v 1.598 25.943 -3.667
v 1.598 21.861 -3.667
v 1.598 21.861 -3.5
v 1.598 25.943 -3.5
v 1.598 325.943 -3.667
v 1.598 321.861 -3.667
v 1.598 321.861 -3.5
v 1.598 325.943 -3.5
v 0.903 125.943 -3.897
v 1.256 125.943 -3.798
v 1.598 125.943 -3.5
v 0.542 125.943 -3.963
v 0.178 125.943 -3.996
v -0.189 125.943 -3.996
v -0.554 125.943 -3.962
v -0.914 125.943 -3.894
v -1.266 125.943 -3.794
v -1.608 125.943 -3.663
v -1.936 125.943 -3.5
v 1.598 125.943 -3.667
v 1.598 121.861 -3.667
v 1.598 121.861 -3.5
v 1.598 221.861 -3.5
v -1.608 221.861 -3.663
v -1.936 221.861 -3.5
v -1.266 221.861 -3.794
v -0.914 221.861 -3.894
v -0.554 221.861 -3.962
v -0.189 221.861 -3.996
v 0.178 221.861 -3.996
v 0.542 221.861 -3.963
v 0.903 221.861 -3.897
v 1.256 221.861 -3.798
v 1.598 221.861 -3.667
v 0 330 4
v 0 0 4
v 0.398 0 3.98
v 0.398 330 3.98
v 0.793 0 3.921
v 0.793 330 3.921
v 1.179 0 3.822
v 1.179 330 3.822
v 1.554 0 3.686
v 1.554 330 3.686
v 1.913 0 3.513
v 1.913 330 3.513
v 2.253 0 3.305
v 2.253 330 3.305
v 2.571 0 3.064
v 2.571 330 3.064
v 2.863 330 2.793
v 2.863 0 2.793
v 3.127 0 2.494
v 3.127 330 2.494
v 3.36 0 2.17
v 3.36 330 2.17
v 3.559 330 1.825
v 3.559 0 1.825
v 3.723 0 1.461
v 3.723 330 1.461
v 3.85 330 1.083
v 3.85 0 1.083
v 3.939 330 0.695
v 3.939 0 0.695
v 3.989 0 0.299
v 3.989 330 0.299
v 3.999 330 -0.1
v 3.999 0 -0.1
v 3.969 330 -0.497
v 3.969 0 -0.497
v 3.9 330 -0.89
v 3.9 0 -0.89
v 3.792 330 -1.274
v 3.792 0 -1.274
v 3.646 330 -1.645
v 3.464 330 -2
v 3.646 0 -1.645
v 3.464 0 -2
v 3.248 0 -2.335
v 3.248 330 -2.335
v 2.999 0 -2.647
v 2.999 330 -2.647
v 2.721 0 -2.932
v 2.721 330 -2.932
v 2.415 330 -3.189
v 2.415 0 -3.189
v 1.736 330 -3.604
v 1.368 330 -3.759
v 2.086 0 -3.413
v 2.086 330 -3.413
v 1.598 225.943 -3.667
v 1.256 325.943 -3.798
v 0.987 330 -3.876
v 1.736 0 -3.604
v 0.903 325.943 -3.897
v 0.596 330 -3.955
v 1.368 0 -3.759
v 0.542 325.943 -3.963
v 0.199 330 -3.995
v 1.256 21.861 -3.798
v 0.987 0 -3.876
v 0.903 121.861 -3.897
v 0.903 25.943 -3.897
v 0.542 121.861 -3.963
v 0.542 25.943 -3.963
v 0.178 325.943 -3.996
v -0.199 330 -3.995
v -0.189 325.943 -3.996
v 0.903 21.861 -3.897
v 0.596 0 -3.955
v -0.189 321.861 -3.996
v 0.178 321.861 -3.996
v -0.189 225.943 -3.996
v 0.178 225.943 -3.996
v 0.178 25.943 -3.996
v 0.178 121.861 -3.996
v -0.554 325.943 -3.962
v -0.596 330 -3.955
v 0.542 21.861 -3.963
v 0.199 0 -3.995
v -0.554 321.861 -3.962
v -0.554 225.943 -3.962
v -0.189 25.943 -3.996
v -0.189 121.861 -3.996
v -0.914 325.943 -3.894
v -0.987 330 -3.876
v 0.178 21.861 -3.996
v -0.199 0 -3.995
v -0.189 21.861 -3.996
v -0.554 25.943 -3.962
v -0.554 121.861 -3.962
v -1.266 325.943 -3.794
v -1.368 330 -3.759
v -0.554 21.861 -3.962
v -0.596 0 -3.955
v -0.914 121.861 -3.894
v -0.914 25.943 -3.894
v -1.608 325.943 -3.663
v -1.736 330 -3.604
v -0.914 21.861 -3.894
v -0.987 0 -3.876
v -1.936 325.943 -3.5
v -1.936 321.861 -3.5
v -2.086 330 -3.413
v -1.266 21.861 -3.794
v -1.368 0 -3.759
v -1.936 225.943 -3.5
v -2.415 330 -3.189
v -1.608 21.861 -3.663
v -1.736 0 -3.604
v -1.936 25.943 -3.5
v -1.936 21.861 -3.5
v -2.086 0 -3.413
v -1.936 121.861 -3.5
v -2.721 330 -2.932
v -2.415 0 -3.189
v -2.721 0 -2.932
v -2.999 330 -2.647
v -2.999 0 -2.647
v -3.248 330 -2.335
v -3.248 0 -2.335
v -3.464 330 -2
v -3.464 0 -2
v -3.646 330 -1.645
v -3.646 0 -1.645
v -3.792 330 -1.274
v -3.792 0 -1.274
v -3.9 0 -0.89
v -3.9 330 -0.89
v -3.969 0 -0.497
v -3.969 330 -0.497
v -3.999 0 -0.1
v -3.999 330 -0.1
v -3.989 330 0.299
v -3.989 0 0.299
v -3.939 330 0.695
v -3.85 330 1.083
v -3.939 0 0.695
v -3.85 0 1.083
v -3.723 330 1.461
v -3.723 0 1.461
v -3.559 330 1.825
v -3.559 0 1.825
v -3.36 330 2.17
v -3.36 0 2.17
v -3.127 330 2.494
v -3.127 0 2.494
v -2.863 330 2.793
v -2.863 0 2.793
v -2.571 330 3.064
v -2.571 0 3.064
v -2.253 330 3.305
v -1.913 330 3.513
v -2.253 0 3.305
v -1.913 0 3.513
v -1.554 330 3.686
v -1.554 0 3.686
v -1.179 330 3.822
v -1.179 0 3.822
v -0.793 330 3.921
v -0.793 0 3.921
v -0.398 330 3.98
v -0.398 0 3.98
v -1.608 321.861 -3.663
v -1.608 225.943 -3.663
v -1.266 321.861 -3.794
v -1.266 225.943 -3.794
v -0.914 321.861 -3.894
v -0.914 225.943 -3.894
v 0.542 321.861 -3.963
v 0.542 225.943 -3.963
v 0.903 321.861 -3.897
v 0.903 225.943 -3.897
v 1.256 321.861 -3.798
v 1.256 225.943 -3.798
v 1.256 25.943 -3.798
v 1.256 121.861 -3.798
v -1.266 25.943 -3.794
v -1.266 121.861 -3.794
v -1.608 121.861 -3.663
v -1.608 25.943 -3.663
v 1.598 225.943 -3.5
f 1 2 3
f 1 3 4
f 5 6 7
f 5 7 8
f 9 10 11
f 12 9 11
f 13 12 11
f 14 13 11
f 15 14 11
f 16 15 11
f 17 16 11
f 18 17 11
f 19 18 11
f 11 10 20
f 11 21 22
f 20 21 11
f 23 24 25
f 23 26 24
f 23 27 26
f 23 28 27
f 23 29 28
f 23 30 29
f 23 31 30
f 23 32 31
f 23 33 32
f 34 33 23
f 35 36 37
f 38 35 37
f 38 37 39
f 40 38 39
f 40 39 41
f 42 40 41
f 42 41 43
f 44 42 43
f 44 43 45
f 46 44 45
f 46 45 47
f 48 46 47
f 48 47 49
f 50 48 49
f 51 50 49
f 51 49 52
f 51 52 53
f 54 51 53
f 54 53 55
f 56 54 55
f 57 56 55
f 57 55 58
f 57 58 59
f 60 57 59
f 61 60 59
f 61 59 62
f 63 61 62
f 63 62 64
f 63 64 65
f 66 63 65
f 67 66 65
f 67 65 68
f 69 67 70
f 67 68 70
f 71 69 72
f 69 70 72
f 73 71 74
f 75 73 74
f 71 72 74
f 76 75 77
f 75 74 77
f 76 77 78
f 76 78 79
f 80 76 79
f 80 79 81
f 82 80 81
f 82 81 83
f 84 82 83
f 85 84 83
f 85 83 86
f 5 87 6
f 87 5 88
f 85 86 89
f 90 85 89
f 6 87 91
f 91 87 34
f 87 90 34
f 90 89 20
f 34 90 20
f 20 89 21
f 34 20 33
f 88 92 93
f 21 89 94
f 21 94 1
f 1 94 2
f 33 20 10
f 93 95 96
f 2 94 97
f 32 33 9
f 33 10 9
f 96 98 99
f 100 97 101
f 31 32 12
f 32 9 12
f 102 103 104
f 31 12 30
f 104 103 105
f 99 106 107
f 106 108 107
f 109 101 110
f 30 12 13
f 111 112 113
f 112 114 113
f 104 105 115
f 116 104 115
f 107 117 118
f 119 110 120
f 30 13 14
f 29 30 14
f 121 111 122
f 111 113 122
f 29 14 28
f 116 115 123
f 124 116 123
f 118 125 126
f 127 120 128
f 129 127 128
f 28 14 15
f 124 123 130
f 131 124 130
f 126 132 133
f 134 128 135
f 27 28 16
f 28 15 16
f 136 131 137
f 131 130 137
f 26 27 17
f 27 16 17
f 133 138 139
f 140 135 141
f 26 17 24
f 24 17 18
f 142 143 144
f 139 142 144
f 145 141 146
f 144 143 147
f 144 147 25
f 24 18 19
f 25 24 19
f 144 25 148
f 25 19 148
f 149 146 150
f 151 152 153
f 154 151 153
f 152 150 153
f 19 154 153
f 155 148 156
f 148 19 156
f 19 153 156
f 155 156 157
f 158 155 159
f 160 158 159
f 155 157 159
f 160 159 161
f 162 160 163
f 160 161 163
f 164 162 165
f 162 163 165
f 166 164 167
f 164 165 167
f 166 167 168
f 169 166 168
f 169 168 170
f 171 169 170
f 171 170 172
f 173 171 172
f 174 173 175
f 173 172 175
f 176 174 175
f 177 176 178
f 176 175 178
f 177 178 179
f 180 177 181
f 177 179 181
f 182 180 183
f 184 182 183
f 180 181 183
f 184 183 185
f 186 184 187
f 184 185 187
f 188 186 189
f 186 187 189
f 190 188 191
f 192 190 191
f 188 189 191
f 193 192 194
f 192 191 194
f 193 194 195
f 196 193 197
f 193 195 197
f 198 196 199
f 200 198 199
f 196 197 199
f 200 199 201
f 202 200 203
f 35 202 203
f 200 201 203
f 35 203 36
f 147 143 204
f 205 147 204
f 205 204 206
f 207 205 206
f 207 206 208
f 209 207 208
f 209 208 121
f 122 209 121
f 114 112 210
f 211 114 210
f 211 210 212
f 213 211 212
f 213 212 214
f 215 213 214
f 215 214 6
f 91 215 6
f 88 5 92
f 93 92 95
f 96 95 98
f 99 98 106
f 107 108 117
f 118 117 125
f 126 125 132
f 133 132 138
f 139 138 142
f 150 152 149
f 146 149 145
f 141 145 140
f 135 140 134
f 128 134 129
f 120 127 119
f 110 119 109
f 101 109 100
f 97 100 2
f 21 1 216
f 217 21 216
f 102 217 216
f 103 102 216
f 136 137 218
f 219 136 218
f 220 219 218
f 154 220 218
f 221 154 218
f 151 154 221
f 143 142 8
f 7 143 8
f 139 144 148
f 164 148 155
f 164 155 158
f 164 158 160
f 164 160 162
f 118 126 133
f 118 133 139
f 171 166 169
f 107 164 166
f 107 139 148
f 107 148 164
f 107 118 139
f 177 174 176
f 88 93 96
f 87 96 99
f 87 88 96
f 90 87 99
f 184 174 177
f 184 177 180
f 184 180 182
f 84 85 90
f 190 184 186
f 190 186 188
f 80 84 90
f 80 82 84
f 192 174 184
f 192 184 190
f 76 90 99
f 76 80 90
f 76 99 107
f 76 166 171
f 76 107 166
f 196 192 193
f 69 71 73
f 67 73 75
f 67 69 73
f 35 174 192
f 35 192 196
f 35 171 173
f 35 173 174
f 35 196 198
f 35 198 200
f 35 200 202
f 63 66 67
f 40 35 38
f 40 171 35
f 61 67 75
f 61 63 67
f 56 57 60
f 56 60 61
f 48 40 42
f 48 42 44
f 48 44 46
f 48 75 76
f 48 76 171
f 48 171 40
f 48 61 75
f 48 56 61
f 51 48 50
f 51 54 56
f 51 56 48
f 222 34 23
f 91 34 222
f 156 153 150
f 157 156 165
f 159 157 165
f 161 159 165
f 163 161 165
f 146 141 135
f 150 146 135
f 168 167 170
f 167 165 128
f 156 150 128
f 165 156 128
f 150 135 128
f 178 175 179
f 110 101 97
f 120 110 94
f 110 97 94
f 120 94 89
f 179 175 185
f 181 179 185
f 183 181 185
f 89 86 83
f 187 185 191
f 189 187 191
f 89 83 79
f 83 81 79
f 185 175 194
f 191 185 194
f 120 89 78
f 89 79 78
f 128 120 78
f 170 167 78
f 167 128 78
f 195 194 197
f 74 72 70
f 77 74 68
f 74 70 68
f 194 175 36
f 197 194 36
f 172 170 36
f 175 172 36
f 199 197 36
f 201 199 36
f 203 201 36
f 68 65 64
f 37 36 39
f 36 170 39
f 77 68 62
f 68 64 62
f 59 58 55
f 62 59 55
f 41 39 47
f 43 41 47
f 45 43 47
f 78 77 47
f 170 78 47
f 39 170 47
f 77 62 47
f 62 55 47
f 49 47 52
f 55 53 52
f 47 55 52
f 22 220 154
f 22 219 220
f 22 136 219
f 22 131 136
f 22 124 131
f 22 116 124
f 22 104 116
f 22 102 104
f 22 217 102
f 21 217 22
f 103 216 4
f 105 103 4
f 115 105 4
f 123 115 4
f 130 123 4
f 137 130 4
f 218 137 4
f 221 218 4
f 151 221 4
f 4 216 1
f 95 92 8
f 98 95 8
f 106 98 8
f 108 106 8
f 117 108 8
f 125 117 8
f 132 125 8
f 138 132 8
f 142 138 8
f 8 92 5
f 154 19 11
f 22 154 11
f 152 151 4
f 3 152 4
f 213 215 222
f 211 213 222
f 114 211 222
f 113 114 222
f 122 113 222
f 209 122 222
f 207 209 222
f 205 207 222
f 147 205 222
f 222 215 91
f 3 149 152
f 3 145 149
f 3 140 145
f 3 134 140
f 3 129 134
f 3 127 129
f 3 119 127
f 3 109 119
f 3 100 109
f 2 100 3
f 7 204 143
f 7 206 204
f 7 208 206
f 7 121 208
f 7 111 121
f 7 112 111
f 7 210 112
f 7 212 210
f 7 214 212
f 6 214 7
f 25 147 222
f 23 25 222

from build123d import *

# Parameters (mm, degrees)
SKETCH1_R           = 4
BOSS_EXTRUDE1_DEPTH = 330
CUT_EXTRUDE1_START  = -3.5
SKETCH2_W           = 3.911370479
SKETCH2_H           = 4.081430066
CUT_EXTRUDE1_DEPTH  = 10


with BuildPart() as part:
    # Sketch1 → Boss-Extrude1 (new body)
    with BuildSketch(Plane(origin=(0, 0, 0), x_dir=(1, 0, 0), z_dir=(0, 1, 0))):
        Circle(SKETCH1_R)
    extrude(amount=BOSS_EXTRUDE1_DEPTH)

    # Sketch2 → Cut-Extrude1 (cut)
    with BuildSketch(Plane.XY.offset(CUT_EXTRUDE1_START)):
        with Locations((-0.357855864, 223.902178758)):
            Rectangle(SKETCH2_W, SKETCH2_H)
        with Locations((-0.357855864, 323.902178758)):
            Rectangle(SKETCH2_W, SKETCH2_H)
        with Locations((-0.357855864, 123.902178758)):
            Rectangle(SKETCH2_W, SKETCH2_H)
        with Locations((-0.357855864, 23.902178758)):
            Rectangle(SKETCH2_W, SKETCH2_H)
    extrude(amount=-CUT_EXTRUDE1_DEPTH, mode=Mode.SUBTRACT)


solid = part.part
